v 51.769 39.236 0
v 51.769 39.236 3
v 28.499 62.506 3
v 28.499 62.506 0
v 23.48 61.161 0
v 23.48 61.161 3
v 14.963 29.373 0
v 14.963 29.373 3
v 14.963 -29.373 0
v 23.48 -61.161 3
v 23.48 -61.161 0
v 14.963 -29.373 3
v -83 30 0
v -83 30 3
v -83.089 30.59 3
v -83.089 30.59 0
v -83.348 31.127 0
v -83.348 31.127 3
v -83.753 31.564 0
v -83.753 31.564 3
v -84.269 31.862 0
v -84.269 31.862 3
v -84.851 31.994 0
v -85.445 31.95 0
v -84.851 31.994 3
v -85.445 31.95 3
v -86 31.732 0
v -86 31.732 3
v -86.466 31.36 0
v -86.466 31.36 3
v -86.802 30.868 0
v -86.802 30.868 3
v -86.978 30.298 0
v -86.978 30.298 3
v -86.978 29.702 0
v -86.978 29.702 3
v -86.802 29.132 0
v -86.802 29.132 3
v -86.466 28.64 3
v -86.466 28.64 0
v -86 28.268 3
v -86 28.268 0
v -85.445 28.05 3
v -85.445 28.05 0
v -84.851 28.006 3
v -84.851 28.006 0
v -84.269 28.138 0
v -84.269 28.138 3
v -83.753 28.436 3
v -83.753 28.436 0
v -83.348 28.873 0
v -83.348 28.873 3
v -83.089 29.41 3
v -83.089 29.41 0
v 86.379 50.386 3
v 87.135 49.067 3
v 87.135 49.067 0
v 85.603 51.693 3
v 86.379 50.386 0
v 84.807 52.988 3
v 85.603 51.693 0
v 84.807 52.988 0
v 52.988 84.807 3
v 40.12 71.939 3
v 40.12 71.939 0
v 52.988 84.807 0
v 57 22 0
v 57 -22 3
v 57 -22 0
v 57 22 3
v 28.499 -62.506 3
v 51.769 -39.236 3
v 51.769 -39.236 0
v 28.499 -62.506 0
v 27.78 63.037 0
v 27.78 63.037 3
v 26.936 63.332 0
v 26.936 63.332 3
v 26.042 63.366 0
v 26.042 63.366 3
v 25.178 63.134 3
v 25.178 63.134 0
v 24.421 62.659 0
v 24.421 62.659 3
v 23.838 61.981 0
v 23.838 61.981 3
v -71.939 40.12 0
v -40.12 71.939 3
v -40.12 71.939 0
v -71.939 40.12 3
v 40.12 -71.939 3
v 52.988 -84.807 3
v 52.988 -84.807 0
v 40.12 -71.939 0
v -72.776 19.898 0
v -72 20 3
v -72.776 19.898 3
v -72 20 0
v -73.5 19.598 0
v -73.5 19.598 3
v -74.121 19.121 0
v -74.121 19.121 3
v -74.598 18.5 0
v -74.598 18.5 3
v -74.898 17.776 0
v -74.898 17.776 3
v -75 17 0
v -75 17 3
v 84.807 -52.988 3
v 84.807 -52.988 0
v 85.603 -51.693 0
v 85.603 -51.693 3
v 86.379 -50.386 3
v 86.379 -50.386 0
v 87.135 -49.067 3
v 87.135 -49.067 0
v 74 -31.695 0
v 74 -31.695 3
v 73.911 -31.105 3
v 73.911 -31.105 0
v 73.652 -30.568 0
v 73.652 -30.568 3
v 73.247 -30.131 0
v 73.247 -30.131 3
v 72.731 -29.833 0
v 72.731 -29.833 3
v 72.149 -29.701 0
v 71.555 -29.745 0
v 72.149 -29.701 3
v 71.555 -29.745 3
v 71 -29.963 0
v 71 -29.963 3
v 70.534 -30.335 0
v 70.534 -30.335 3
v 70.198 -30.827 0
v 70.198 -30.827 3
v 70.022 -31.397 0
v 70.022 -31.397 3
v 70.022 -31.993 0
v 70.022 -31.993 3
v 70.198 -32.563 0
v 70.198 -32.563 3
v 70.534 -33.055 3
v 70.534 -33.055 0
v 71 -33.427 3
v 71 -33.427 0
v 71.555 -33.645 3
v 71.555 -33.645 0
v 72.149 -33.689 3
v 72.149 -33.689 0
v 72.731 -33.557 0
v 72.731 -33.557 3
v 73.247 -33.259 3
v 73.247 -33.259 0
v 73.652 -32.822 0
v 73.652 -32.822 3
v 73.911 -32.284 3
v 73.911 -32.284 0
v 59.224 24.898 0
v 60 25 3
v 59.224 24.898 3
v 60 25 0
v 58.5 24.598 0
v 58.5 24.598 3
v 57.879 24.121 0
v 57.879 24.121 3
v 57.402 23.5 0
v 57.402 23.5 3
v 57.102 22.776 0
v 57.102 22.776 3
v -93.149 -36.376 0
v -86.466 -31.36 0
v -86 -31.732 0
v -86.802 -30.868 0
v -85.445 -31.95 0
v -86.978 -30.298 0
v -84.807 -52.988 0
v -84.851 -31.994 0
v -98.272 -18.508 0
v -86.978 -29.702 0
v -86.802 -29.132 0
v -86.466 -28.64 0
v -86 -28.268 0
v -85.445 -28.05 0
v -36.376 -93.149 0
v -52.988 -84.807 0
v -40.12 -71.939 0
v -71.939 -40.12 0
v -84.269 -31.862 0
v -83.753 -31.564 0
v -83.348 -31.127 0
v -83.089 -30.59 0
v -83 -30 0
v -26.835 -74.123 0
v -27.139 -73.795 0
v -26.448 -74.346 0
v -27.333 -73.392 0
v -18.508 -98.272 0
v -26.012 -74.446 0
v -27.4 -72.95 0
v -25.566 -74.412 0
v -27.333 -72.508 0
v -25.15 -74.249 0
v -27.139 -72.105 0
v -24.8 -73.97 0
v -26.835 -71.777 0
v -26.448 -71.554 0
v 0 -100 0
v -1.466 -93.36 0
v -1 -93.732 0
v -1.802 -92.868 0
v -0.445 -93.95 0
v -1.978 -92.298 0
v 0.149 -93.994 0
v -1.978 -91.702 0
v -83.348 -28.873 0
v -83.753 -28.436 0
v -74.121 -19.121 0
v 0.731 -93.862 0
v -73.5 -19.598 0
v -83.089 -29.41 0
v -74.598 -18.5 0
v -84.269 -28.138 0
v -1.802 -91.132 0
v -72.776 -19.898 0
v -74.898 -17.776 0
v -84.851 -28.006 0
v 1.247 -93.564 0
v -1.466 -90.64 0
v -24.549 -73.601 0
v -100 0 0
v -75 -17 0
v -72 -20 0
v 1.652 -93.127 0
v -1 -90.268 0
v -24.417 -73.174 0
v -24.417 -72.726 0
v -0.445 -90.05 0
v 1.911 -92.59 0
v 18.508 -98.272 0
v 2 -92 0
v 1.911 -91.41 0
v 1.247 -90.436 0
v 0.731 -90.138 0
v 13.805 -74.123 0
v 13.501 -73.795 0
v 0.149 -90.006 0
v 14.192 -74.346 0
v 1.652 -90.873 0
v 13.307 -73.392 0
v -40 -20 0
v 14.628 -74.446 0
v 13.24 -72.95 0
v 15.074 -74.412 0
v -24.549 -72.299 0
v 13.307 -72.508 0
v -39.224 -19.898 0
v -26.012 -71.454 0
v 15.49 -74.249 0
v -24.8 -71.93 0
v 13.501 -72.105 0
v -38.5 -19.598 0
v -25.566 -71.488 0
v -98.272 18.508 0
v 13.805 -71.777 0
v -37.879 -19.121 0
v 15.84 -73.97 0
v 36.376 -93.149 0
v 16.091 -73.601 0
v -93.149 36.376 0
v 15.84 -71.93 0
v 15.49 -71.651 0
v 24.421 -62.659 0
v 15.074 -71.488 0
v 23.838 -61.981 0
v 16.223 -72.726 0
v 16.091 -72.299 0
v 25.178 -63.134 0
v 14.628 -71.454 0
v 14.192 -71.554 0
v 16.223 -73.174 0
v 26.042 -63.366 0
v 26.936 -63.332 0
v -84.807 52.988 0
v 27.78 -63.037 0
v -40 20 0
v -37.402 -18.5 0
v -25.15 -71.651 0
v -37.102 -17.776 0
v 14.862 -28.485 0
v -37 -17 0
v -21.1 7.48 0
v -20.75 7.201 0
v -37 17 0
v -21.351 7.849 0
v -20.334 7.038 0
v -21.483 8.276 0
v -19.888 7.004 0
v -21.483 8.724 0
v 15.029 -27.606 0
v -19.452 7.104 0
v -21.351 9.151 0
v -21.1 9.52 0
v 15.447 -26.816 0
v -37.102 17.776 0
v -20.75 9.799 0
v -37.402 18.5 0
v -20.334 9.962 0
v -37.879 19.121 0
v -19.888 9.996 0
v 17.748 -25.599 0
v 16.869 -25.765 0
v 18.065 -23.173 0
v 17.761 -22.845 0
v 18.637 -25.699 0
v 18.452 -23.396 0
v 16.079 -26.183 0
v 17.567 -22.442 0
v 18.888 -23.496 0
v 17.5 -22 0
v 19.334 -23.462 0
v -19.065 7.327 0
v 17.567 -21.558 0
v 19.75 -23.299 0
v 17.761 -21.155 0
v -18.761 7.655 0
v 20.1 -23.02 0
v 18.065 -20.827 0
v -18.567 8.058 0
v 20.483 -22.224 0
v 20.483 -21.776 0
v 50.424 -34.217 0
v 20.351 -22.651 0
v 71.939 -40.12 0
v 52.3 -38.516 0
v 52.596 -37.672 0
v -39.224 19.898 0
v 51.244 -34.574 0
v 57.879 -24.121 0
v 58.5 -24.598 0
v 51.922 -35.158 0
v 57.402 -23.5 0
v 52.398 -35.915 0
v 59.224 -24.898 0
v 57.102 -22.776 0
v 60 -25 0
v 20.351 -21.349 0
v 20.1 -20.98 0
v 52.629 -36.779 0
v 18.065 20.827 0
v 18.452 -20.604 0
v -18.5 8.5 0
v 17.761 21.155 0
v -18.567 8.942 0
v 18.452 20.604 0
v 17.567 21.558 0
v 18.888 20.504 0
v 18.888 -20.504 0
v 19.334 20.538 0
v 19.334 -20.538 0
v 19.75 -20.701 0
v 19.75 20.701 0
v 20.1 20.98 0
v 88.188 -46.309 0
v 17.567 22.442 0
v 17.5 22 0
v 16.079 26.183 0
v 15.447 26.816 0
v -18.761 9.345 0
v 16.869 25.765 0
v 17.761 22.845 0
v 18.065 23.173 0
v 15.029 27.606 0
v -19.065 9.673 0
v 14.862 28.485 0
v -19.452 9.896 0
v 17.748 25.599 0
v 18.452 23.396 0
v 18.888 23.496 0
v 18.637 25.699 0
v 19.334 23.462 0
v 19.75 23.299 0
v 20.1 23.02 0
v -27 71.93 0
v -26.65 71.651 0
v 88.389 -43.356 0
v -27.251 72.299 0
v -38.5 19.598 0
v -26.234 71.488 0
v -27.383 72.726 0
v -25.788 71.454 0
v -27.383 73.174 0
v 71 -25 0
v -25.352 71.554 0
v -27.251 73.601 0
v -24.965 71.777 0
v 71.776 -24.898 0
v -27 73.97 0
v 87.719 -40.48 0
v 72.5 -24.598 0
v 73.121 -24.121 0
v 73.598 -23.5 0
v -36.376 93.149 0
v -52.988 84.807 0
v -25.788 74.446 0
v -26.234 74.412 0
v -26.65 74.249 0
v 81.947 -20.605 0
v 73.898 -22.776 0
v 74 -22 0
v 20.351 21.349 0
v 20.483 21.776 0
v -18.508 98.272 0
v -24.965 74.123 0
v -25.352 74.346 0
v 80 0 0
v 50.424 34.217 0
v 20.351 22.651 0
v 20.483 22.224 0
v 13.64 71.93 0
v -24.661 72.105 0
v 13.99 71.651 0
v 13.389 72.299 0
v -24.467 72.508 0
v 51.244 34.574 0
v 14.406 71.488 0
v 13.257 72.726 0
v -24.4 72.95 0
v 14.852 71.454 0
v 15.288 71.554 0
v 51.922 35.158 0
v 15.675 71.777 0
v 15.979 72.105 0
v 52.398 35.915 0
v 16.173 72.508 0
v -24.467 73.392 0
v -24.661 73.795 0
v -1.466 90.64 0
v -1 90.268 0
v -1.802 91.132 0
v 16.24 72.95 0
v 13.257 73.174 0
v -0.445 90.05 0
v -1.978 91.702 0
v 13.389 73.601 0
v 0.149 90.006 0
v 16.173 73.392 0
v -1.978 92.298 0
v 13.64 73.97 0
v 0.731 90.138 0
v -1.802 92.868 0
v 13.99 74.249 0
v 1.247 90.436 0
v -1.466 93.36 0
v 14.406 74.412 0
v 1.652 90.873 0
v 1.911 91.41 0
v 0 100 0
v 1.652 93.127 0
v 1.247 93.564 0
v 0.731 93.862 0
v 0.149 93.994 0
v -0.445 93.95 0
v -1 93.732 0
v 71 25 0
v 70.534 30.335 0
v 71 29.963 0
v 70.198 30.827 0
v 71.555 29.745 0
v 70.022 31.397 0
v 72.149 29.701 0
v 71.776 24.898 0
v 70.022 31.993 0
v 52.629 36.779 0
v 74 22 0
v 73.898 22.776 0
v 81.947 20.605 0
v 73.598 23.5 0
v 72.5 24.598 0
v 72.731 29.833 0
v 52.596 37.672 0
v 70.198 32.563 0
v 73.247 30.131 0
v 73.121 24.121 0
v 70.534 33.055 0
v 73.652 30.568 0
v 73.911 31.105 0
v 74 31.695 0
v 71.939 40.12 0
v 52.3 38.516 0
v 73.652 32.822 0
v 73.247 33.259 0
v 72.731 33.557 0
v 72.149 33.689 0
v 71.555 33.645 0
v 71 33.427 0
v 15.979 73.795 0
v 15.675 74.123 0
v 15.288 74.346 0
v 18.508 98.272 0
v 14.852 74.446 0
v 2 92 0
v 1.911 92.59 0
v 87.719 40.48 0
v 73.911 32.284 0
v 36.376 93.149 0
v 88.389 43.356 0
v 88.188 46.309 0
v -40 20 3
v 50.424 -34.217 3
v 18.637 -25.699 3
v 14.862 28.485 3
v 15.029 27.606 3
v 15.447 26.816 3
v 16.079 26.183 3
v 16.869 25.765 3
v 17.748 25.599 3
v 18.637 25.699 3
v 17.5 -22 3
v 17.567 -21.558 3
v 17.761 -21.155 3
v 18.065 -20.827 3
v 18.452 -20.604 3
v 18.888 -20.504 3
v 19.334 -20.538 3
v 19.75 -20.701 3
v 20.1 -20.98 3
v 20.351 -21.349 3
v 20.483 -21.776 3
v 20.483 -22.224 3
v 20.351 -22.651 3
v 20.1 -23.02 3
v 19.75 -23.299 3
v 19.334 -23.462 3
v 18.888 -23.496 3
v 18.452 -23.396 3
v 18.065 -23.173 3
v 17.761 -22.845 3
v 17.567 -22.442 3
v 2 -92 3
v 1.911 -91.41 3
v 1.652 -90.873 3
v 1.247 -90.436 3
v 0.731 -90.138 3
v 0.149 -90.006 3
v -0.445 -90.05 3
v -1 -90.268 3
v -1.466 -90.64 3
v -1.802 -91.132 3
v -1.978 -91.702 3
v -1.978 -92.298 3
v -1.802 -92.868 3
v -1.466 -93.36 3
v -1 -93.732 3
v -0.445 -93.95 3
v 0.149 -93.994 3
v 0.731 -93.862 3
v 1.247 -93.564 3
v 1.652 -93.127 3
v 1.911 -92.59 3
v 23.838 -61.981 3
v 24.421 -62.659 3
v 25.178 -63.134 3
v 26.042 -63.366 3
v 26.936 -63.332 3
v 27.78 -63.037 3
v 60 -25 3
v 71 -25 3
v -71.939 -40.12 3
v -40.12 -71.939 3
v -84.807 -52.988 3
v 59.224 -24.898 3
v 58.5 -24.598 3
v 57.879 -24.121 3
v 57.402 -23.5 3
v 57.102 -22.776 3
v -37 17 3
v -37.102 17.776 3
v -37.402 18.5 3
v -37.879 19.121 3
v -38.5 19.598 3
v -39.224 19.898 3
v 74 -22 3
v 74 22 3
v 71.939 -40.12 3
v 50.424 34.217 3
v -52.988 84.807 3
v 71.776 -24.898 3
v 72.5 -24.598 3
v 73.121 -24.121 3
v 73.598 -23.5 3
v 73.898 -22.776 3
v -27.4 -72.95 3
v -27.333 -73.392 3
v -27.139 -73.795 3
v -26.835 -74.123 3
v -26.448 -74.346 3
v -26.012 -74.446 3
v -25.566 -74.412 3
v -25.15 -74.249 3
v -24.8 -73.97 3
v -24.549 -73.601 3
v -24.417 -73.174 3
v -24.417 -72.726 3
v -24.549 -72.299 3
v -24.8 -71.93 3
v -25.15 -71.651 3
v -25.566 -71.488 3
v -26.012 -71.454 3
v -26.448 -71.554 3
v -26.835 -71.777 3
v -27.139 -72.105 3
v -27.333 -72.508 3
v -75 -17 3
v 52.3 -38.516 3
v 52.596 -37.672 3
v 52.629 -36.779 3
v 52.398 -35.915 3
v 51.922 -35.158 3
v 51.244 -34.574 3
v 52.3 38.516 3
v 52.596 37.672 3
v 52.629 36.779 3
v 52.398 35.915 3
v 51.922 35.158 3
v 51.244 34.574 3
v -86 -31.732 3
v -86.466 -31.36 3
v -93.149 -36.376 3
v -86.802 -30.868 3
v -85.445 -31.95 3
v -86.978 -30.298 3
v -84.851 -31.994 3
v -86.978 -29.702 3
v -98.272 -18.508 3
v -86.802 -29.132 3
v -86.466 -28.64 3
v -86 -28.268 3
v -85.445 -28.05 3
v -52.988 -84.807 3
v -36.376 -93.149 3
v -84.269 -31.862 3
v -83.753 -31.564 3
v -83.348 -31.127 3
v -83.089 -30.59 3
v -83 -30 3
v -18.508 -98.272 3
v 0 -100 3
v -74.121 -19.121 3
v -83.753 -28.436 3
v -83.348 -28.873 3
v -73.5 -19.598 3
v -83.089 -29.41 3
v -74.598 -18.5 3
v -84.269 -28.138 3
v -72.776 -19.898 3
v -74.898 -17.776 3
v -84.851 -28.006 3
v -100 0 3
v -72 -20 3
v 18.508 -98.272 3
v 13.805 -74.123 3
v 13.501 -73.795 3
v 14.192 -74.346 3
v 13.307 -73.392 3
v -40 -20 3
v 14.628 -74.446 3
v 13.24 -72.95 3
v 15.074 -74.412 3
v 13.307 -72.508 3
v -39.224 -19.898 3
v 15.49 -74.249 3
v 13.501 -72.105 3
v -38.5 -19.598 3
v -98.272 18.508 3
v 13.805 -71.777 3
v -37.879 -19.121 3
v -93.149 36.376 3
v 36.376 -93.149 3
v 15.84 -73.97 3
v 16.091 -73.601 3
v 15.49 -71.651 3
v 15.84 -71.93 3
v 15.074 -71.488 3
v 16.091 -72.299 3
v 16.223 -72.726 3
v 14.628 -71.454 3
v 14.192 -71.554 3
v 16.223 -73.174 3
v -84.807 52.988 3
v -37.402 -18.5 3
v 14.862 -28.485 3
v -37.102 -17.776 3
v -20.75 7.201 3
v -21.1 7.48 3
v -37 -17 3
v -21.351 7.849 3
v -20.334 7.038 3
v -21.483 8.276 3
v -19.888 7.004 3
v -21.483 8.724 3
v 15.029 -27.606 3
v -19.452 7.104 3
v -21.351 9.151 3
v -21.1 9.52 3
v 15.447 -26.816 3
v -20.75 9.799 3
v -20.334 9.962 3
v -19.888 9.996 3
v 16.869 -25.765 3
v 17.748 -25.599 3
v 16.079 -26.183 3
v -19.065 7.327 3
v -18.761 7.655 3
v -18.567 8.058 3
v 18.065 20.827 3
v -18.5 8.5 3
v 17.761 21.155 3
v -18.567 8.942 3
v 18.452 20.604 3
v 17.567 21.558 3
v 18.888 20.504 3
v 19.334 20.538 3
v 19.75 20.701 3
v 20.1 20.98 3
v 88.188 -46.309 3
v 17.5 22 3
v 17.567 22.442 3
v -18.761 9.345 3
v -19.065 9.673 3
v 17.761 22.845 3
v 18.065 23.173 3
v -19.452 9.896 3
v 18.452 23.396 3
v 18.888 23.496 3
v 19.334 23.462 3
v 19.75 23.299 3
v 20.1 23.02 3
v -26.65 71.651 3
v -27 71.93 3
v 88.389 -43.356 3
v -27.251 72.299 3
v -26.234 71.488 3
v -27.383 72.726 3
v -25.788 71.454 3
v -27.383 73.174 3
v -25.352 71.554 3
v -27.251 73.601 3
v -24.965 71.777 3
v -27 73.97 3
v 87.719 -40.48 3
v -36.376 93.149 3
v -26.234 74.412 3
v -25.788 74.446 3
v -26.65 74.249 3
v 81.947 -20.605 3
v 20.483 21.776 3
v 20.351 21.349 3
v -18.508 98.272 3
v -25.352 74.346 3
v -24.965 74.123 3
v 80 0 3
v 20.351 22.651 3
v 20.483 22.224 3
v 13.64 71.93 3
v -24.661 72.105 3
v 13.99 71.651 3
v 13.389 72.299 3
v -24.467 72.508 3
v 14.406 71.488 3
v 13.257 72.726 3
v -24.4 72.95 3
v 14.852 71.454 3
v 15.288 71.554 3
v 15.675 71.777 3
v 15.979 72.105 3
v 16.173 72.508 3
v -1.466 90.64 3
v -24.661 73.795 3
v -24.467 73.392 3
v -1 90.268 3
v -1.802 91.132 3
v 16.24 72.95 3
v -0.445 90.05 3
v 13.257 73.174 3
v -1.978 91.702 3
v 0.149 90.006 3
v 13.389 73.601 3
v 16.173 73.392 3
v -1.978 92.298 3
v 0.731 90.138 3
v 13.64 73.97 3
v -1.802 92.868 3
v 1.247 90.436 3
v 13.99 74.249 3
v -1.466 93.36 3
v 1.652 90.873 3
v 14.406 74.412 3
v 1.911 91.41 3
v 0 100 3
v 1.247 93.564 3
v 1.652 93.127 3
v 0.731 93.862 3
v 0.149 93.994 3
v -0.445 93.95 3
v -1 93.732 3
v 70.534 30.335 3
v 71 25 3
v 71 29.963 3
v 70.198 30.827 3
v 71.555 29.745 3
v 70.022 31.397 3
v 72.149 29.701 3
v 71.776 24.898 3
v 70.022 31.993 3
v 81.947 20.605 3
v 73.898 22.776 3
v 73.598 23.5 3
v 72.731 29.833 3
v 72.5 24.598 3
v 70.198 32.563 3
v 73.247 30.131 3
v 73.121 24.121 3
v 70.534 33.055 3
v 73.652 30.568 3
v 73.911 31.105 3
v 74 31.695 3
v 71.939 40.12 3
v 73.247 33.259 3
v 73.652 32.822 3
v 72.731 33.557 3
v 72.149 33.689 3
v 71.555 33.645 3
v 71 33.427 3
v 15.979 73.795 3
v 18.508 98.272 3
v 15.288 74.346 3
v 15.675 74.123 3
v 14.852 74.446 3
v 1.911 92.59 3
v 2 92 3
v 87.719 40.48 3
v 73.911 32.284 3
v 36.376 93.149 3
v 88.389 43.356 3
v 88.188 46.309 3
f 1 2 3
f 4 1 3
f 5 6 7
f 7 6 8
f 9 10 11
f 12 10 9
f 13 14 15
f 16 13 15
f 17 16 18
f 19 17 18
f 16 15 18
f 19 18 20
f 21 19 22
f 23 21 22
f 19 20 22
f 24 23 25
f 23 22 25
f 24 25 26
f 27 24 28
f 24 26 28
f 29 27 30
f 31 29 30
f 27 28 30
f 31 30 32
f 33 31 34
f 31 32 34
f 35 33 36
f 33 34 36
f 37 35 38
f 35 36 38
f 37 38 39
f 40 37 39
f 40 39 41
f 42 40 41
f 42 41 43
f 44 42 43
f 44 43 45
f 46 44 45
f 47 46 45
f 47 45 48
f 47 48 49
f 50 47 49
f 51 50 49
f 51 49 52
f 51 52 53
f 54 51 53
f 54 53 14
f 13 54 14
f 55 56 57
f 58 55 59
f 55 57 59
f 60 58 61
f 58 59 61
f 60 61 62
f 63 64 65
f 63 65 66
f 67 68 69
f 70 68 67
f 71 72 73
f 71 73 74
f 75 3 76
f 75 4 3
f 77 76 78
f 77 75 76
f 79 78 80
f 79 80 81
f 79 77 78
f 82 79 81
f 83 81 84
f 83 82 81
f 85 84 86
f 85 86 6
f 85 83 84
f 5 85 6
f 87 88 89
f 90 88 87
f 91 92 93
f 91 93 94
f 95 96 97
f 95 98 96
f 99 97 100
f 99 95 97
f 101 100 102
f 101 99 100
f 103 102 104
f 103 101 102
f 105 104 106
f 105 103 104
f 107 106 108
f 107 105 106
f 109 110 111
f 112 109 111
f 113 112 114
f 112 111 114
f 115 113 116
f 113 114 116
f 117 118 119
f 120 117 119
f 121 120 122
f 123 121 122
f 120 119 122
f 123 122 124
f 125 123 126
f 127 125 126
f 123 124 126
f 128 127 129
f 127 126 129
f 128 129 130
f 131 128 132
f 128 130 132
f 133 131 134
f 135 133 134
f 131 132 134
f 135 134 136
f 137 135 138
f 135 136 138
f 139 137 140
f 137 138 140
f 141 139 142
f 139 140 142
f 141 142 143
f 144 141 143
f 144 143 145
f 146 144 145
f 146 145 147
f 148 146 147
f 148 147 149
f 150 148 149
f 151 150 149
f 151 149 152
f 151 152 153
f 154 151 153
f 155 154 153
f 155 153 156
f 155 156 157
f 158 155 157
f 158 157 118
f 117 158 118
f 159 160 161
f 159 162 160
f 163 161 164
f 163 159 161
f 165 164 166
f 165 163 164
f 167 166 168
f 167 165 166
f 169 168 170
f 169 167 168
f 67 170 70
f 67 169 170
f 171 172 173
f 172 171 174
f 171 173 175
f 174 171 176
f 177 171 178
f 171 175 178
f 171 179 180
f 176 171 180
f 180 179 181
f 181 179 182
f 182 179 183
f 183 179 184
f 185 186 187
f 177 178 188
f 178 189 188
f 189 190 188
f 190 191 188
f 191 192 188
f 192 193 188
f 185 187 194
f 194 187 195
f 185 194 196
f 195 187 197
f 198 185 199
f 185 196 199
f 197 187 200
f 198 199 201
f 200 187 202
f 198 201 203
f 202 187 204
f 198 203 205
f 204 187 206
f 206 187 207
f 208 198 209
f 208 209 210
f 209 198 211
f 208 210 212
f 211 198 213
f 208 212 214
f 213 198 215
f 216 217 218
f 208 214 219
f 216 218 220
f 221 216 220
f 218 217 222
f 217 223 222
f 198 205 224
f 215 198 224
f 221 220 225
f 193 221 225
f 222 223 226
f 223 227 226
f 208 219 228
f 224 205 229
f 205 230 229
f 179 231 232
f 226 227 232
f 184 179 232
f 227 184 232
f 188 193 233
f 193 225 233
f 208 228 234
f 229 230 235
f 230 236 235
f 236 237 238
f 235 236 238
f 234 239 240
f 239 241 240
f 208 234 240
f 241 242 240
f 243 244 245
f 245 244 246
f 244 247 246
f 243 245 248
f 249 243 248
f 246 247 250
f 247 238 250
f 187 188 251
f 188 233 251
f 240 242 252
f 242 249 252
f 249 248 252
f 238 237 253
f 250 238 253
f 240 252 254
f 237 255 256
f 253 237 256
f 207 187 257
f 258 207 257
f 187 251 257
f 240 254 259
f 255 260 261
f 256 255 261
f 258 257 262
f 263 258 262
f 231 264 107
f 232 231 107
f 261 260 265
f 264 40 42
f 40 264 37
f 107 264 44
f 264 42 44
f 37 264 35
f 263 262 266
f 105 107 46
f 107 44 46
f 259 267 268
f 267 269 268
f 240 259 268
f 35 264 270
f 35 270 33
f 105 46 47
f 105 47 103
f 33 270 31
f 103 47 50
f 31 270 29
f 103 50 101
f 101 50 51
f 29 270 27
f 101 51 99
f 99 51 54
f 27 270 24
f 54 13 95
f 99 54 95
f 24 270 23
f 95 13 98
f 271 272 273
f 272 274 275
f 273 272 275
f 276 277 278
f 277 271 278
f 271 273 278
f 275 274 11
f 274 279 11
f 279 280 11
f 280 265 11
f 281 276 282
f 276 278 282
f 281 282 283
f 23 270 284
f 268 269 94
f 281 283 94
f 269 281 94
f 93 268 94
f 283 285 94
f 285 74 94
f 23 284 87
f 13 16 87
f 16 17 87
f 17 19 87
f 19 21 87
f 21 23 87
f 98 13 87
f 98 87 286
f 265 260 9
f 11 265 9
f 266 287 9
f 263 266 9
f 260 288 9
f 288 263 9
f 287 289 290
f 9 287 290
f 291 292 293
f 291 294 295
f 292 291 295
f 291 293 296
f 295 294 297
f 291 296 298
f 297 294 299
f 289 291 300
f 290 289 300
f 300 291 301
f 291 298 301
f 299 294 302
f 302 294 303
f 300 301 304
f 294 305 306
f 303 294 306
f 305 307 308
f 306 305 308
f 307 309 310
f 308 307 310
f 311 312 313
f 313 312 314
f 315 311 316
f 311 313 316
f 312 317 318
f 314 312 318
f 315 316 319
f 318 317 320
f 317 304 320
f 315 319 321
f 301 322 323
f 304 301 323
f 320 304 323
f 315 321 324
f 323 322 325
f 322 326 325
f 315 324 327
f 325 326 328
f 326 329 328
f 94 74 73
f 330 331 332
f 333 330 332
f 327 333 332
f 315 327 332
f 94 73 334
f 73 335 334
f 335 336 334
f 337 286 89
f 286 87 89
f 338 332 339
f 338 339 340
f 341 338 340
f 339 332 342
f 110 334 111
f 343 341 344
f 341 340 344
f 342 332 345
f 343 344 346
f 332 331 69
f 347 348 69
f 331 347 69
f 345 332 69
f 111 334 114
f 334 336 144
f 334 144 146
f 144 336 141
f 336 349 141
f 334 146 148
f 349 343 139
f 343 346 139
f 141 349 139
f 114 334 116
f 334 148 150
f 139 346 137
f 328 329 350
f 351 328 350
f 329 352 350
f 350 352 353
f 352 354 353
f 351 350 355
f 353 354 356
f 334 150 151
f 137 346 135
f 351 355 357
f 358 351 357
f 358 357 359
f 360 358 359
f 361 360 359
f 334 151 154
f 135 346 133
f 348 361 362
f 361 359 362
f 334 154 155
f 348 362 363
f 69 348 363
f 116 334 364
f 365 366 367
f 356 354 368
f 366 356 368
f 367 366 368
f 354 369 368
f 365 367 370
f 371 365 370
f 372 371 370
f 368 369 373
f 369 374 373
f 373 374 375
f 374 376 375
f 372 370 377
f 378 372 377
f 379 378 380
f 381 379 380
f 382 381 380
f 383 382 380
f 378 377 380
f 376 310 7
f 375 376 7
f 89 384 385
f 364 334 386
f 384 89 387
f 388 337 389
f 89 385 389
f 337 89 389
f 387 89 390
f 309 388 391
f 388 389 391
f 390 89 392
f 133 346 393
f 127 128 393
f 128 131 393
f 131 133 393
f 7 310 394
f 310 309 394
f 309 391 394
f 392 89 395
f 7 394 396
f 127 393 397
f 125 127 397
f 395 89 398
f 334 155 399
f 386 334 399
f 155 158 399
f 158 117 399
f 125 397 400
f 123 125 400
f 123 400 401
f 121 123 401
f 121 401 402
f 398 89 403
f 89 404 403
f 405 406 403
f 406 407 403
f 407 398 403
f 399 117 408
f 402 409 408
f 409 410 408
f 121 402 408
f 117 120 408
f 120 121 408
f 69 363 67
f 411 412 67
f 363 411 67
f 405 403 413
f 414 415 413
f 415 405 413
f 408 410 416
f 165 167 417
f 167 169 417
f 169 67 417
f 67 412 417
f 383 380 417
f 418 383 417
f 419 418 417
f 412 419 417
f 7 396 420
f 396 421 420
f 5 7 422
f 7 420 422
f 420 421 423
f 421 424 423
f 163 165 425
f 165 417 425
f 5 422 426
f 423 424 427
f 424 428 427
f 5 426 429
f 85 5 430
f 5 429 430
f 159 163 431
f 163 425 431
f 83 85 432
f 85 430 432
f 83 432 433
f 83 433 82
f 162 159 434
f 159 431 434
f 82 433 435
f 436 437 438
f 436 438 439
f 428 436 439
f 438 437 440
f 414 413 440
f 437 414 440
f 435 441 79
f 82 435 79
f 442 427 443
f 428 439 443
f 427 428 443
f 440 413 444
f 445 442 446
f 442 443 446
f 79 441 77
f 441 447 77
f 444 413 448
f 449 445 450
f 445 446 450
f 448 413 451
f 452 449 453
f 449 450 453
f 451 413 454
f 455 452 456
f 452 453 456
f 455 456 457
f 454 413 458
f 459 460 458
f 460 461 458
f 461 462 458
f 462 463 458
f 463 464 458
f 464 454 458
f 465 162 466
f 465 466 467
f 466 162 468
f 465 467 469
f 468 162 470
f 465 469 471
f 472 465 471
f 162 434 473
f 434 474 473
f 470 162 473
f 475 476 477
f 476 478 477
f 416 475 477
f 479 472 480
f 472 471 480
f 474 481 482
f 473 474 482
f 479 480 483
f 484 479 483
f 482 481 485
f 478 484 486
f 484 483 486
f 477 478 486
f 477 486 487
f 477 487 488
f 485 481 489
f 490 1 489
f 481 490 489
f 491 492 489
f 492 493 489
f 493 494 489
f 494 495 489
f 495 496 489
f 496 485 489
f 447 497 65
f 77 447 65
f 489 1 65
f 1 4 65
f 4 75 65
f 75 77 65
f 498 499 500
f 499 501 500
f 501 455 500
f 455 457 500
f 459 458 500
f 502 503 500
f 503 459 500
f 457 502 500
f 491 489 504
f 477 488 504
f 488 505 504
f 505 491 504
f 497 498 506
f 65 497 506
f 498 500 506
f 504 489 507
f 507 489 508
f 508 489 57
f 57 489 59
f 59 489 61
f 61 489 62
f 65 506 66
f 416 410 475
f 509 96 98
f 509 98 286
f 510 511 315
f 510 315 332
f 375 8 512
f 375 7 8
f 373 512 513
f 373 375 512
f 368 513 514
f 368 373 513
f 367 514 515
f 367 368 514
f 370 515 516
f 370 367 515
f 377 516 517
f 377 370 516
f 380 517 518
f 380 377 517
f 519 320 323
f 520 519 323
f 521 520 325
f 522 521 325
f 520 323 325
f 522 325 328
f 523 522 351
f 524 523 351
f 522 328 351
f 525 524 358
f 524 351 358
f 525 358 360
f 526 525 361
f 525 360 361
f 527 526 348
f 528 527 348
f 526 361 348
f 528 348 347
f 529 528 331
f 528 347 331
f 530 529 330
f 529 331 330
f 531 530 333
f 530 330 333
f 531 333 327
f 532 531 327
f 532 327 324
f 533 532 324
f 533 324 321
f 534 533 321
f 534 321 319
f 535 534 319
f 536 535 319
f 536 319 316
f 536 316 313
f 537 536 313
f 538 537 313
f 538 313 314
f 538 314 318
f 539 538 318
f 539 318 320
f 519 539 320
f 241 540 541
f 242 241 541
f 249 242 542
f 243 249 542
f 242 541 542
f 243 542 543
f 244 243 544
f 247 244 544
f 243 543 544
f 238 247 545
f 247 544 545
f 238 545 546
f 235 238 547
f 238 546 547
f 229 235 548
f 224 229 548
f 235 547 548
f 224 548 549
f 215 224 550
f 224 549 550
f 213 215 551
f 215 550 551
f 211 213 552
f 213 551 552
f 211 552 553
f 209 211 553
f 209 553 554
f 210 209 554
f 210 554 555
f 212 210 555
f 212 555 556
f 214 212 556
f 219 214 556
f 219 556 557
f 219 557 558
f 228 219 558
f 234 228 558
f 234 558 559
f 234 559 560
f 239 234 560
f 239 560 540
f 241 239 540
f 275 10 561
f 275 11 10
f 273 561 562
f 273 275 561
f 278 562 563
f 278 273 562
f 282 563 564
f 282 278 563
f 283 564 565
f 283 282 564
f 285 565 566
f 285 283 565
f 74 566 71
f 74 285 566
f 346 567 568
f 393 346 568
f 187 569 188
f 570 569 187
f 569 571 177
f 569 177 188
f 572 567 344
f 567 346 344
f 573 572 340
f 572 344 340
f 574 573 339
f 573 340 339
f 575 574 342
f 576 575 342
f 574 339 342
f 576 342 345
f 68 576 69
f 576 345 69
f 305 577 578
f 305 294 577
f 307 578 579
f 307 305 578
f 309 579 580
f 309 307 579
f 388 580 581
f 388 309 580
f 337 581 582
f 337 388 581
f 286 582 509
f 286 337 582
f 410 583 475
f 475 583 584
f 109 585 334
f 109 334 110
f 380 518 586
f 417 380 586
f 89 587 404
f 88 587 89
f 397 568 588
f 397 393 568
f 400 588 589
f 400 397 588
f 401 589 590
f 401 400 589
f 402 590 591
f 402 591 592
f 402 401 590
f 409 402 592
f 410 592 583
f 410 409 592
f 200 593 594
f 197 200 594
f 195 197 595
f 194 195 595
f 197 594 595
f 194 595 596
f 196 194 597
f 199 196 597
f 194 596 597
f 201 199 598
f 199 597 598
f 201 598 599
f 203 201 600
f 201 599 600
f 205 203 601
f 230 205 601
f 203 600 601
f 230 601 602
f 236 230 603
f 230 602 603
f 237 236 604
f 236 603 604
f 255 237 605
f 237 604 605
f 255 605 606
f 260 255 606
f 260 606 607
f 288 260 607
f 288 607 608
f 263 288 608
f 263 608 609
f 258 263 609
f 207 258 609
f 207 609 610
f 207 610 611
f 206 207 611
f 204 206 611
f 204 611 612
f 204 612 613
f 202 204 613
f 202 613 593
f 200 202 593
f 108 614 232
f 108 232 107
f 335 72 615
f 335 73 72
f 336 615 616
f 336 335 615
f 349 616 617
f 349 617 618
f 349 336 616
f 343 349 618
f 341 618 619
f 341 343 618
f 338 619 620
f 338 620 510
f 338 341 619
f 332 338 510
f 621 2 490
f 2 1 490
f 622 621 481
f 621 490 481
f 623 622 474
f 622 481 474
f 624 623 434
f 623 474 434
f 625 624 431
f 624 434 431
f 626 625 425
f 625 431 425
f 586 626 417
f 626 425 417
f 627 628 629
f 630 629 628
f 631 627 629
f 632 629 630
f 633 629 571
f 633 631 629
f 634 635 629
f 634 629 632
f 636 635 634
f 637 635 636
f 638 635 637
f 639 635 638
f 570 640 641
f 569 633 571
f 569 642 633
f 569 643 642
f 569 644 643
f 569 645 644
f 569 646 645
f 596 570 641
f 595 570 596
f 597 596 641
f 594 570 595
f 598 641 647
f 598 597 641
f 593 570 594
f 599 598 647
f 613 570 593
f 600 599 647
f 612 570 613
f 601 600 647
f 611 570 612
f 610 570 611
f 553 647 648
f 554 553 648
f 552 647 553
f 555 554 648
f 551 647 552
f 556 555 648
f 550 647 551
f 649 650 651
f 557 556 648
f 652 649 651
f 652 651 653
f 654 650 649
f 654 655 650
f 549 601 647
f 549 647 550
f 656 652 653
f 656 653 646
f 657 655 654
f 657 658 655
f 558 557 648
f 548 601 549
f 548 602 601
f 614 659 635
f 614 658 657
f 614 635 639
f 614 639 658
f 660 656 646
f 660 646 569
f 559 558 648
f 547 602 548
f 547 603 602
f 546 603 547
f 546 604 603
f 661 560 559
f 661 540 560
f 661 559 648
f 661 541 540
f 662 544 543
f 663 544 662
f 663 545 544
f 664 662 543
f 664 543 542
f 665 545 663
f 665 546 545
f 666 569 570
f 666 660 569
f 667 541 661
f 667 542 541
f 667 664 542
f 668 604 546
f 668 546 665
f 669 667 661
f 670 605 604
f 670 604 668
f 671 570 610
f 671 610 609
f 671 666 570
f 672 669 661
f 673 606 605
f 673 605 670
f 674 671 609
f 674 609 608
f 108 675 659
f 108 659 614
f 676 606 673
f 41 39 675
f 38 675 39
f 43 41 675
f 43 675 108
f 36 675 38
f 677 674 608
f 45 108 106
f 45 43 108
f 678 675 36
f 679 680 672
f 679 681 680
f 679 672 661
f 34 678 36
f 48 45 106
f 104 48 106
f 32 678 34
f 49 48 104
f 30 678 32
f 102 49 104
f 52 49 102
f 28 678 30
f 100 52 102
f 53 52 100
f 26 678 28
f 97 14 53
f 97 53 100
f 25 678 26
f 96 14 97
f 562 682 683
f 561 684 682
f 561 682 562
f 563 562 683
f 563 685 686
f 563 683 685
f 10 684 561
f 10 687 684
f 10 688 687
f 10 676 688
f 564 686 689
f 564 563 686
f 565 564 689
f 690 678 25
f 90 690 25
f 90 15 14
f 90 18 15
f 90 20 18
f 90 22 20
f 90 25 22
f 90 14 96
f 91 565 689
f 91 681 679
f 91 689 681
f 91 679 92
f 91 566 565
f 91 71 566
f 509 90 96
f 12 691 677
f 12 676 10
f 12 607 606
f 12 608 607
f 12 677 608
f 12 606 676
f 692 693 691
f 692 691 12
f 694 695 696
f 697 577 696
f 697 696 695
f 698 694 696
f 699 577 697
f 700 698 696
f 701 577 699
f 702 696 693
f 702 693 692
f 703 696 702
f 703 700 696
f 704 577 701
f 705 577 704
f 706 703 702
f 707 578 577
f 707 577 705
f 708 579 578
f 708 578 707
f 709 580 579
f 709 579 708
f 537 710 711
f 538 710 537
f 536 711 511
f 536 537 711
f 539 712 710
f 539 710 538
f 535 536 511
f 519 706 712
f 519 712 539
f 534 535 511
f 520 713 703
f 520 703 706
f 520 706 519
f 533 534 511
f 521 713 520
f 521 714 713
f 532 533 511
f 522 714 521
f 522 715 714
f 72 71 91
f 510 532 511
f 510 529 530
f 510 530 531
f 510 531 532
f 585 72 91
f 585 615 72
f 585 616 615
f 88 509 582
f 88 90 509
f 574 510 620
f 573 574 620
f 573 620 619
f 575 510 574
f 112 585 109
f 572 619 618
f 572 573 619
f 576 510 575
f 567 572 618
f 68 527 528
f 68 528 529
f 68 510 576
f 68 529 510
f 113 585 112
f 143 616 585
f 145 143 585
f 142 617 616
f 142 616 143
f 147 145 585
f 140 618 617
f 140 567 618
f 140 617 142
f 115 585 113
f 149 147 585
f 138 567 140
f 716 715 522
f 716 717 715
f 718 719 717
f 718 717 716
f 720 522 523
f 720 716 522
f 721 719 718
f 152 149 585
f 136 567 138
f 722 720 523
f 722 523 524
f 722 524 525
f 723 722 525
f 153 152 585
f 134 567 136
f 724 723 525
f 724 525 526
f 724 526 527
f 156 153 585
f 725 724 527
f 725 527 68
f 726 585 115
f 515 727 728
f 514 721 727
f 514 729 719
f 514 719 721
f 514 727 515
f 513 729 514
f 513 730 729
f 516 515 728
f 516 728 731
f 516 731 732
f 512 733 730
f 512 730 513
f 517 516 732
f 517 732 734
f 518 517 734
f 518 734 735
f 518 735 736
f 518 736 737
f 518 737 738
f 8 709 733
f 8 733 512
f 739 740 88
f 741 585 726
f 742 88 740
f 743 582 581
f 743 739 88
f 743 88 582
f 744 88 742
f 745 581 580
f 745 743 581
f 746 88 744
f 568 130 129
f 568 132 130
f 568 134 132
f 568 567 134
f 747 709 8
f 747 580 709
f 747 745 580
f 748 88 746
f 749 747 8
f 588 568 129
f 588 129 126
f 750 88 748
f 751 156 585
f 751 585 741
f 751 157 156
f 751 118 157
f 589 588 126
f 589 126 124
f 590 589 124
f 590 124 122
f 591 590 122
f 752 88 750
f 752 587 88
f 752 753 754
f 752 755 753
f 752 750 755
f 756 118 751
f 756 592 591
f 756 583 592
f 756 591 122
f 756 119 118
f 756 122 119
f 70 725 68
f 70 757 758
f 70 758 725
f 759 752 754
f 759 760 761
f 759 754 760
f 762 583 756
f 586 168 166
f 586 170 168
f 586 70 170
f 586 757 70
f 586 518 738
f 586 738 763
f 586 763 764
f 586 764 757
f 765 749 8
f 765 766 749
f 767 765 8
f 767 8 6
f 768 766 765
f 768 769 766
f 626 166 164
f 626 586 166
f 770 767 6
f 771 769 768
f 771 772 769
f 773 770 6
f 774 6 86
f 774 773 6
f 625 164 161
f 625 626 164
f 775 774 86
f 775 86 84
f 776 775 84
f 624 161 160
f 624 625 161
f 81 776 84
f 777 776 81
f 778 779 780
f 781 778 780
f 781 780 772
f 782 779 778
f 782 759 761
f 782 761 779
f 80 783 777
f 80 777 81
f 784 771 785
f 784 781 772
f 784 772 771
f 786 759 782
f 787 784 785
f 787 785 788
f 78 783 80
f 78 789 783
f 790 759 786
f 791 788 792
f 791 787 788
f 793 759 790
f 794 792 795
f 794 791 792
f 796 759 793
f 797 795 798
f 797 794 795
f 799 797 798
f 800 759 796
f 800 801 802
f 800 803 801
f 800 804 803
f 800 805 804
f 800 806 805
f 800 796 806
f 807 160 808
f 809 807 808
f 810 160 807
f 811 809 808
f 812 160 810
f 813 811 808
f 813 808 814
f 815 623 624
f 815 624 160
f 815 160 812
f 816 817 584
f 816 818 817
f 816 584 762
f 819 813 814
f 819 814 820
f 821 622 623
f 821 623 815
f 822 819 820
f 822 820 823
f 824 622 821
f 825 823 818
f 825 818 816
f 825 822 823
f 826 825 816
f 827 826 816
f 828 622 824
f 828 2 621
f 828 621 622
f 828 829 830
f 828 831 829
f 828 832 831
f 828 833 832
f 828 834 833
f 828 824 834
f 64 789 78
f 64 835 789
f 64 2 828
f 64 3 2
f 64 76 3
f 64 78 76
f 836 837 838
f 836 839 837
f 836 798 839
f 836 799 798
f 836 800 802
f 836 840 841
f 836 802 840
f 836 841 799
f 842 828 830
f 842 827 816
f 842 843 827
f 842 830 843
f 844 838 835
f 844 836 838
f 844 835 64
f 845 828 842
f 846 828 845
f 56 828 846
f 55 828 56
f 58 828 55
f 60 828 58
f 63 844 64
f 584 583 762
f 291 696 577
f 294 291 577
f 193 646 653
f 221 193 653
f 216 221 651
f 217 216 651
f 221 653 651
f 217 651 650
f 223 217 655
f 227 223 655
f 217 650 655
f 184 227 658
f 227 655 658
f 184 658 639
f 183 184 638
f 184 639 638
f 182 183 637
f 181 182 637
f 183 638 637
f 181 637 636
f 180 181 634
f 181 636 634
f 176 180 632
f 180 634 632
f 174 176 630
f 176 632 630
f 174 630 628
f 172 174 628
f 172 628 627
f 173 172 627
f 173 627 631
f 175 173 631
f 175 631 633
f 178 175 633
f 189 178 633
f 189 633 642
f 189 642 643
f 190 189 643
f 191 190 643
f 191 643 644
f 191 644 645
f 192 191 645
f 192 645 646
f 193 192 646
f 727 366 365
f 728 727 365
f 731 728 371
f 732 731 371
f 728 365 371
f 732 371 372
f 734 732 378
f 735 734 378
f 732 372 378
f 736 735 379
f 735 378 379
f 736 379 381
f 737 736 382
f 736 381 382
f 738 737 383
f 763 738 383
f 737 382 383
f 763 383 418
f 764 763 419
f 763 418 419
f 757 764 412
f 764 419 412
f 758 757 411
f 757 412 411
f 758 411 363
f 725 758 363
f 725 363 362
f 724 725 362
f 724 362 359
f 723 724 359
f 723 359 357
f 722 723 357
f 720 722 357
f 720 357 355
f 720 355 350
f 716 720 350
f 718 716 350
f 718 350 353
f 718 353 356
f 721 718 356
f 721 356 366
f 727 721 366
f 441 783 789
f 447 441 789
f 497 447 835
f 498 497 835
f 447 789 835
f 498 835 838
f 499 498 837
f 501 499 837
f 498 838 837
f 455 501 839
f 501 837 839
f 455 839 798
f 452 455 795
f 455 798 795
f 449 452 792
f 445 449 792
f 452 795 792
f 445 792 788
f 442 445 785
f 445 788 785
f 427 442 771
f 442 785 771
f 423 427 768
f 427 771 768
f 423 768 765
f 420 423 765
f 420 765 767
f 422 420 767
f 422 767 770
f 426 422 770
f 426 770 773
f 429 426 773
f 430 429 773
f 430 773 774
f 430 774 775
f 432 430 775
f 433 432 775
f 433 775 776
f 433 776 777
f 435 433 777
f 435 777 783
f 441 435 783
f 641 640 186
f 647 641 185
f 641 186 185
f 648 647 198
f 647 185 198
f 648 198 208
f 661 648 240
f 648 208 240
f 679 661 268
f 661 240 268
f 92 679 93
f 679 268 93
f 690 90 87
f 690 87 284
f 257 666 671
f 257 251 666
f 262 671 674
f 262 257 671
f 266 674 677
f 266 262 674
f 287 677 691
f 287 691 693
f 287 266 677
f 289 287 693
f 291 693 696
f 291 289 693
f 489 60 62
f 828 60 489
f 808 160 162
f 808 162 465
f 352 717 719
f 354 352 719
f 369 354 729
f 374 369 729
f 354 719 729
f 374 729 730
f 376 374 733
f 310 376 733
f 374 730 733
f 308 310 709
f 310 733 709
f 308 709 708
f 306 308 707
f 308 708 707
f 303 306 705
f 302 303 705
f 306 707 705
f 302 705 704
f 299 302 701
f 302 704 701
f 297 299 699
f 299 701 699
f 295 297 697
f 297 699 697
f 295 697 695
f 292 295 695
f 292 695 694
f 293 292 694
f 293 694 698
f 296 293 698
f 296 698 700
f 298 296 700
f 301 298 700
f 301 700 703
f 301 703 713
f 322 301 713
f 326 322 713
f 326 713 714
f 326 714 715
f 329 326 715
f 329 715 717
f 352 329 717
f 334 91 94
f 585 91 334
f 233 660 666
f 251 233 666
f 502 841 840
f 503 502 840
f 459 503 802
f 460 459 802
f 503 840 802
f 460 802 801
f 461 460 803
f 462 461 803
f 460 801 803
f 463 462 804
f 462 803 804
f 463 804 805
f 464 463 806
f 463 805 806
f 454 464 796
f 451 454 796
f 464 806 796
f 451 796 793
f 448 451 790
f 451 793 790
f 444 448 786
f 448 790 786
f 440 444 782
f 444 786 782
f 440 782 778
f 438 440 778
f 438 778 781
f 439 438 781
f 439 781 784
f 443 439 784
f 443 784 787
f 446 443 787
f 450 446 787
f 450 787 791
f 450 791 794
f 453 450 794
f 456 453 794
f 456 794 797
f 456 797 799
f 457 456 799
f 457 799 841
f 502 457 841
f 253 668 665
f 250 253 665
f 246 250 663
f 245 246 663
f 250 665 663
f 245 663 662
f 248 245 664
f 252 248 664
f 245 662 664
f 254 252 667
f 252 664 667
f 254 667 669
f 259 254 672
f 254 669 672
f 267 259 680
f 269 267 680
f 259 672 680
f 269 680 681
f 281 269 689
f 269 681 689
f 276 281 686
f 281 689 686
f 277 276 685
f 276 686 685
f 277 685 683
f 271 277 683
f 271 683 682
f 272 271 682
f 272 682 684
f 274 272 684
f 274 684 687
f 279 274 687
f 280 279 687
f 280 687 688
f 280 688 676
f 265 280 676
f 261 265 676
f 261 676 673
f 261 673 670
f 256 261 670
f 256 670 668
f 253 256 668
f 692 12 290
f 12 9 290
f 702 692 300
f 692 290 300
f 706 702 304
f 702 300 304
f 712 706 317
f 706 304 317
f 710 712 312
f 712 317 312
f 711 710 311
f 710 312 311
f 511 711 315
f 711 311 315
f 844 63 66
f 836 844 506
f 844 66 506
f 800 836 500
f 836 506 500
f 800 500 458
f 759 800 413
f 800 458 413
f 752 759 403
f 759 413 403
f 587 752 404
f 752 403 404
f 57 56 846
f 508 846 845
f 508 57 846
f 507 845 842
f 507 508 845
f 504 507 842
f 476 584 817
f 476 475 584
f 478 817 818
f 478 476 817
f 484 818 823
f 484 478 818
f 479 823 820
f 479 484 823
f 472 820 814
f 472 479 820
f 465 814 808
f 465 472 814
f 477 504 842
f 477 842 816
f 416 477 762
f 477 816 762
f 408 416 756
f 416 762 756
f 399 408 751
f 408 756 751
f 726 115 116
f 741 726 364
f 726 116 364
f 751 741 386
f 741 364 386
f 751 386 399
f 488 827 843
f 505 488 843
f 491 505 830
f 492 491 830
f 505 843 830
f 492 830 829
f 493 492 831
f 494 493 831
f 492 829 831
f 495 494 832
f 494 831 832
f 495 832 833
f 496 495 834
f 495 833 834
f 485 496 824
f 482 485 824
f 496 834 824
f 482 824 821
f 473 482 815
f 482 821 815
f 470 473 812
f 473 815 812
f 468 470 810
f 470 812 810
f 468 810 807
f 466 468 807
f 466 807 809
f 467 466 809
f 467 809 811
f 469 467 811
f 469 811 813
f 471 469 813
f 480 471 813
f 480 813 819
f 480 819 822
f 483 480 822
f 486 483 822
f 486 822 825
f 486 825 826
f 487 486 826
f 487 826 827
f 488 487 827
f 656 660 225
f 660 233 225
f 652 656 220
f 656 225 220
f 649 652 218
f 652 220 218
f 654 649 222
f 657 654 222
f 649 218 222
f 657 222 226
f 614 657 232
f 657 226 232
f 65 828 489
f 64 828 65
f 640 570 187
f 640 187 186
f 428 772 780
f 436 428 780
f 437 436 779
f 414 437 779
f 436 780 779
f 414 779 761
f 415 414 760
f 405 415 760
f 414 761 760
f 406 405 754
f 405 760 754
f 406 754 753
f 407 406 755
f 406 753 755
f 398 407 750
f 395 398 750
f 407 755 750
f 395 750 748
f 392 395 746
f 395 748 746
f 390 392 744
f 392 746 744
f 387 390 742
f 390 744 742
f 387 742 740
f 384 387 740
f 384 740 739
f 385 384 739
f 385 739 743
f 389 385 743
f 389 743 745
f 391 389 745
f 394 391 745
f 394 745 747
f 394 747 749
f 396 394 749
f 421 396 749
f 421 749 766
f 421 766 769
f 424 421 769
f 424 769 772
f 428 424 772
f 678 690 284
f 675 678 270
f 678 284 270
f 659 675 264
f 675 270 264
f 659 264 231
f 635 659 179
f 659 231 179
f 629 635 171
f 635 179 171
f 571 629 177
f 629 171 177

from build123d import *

# Parameters (mm, degrees)
CROQUIS1_R              = 100
SALIENTE_EXTRUIR1_DEPTH = 3
CROQUIS3_R              = 110
CORTAR_EXTRUIR1_DEPTH   = 3
REDONDEO1_R             = 10
CORTAR_EXTRUIR3_DEPTH   = 10
CROQUIS10_R             = 1.5
CORTAR_EXTRUIR4_DEPTH   = 142.453172607
CROQUIS11_R             = 2
CROQUIS11_W             = 17
CROQUIS11_H             = 50
CROQUIS11_W_2           = 38
CROQUIS11_H_2           = 40
CORTAR_EXTRUIR5_DEPTH   = 10
REDONDEO2_R             = 3
CROQUIS12_R             = 1.5
CORTAR_EXTRUIR6_DEPTH   = 142.453172607


with BuildPart() as part:
    # Croquis1 → Saliente-Extruir1 (new body)
    with BuildSketch(Plane.XY):
        Circle(CROQUIS1_R)
    extrude(amount=SALIENTE_EXTRUIR1_DEPTH)

    # Croquis3 → Cortar-Extruir1 (cut)
    with BuildSketch(Plane.XY.offset(3)):
        with Locations((190, 0)):
            Circle(CROQUIS3_R)
    extrude(amount=-CORTAR_EXTRUIR1_DEPTH, mode=Mode.SUBTRACT)

    # Redondeo1
    redondeo1_edges = [part.edges().sort_by_distance(p)[0] for p in [
        (89.473684211, -44.659375654, 1.5),
        (89.473684211, 44.659375654, 1.5),
    ]]
    fillet(redondeo1_edges, radius=REDONDEO1_R)

    # Croquis7 → Cortar-Extruir3 (cut)
    with BuildSketch(Plane.XY.offset(3)):
        Polygon((-71.939339828, -40.119534675), (-40.119534675, -71.939339828), (-57.797204204, -89.617009358), (-89.617009358, -57.797204204), align=None)
        Polygon((-40.119534675, 71.939339828), (-71.939339828, 40.119534675), (-89.617009358, 57.797204204), (-57.797204204, 89.617009358), align=None)
        Polygon((71.939339828, 40.119534675), (40.119534675, 71.939339828), (57.797204204, 89.617009358), (89.617009358, 57.797204204), align=None)
        Polygon((40.119534675, -71.939339828), (71.939339828, -40.119534675), (89.617009358, -57.797204204), (57.797204204, -89.617009358), align=None)
    extrude(amount=-CORTAR_EXTRUIR3_DEPTH, mode=Mode.SUBTRACT)

    # Croquis10 → Cortar-Extruir4 (cut, through all)
    with BuildSketch(Plane.XY.offset(3)):
        with Locations((-20, 8.5)):
            Circle(CROQUIS10_R)
        with Locations((14.74, 72.95)):
            Circle(CROQUIS10_R)
        with Locations((-25.9, 72.95)):
            Circle(CROQUIS10_R)
        with Locations(Location((14.74, -72.95, 0), (0, 0, 180))):
            Circle(CROQUIS10_R)
        with Locations(Location((-25.9, -72.95, 0), (0, 0, 180))):
            Circle(CROQUIS10_R)
    extrude(amount=-CORTAR_EXTRUIR4_DEPTH, mode=Mode.SUBTRACT)

    # Croquis11 → Cortar-Extruir5 (cut)
    with BuildSketch(Plane.XY.offset(3)):
        with Locations((0, 92)):
            Circle(CROQUIS11_R)
        with Locations((0, -92)):
            Circle(CROQUIS11_R)
        with Locations((72, 31.694913472)):
            Circle(CROQUIS11_R)
        with Locations((72, -31.694913472)):
            Circle(CROQUIS11_R)
        with Locations((-85, -30)):
            Circle(CROQUIS11_R)
        with Locations((-85, 30)):
            Circle(CROQUIS11_R)
        with Locations((65.5, 0)):
            Rectangle(CROQUIS11_W, CROQUIS11_H)
        Polygon((55.443488939, 35.561561695), (24.824867154, 66.18018348), (13.617673752, 24.354368293), align=None)
        Polygon((13.617673752, -24.354368293), (55.443488939, -35.561561695), (24.824867154, -66.18018348), align=None)
        with Locations((-56, 0)):
            Rectangle(CROQUIS11_W_2, CROQUIS11_H_2)
    extrude(amount=-CORTAR_EXTRUIR5_DEPTH, mode=Mode.SUBTRACT)

    # Redondeo2
    redondeo2_edges = [part.edges().sort_by_distance(p)[0] for p in [
        (74, 25, 1.5),
        (74, -25, 1.5),
        (57, -25, 1.5),
        (57, 25, 1.5),
        (55.443488939, 35.561561695, 1.5),
        (13.617673752, 24.354368293, 1.5),
        (24.824867154, 66.18018348, 1.5),
        (24.824867154, -66.18018348, 1.5),
        (13.617673752, -24.354368293, 1.5),
        (55.443488939, -35.561561695, 1.5),
        (-37, 20, 1.5),
        (-37, -20, 1.5),
        (-75, -20, 1.5),
        (-75, 20, 1.5),
    ]]
    fillet(redondeo2_edges, radius=REDONDEO2_R)

    # Croquis12 → Cortar-Extruir6 (cut, through all)
    with BuildSketch(Plane(origin=(0, 0, 0), x_dir=(-1, 0, 0), z_dir=(0, 0, -1))):
        with Locations((-19, 22)):
            Circle(CROQUIS12_R)
        with Locations((-19, -22)):
            Circle(CROQUIS12_R)
    extrude(amount=-CORTAR_EXTRUIR6_DEPTH, mode=Mode.SUBTRACT)


solid = part.part
